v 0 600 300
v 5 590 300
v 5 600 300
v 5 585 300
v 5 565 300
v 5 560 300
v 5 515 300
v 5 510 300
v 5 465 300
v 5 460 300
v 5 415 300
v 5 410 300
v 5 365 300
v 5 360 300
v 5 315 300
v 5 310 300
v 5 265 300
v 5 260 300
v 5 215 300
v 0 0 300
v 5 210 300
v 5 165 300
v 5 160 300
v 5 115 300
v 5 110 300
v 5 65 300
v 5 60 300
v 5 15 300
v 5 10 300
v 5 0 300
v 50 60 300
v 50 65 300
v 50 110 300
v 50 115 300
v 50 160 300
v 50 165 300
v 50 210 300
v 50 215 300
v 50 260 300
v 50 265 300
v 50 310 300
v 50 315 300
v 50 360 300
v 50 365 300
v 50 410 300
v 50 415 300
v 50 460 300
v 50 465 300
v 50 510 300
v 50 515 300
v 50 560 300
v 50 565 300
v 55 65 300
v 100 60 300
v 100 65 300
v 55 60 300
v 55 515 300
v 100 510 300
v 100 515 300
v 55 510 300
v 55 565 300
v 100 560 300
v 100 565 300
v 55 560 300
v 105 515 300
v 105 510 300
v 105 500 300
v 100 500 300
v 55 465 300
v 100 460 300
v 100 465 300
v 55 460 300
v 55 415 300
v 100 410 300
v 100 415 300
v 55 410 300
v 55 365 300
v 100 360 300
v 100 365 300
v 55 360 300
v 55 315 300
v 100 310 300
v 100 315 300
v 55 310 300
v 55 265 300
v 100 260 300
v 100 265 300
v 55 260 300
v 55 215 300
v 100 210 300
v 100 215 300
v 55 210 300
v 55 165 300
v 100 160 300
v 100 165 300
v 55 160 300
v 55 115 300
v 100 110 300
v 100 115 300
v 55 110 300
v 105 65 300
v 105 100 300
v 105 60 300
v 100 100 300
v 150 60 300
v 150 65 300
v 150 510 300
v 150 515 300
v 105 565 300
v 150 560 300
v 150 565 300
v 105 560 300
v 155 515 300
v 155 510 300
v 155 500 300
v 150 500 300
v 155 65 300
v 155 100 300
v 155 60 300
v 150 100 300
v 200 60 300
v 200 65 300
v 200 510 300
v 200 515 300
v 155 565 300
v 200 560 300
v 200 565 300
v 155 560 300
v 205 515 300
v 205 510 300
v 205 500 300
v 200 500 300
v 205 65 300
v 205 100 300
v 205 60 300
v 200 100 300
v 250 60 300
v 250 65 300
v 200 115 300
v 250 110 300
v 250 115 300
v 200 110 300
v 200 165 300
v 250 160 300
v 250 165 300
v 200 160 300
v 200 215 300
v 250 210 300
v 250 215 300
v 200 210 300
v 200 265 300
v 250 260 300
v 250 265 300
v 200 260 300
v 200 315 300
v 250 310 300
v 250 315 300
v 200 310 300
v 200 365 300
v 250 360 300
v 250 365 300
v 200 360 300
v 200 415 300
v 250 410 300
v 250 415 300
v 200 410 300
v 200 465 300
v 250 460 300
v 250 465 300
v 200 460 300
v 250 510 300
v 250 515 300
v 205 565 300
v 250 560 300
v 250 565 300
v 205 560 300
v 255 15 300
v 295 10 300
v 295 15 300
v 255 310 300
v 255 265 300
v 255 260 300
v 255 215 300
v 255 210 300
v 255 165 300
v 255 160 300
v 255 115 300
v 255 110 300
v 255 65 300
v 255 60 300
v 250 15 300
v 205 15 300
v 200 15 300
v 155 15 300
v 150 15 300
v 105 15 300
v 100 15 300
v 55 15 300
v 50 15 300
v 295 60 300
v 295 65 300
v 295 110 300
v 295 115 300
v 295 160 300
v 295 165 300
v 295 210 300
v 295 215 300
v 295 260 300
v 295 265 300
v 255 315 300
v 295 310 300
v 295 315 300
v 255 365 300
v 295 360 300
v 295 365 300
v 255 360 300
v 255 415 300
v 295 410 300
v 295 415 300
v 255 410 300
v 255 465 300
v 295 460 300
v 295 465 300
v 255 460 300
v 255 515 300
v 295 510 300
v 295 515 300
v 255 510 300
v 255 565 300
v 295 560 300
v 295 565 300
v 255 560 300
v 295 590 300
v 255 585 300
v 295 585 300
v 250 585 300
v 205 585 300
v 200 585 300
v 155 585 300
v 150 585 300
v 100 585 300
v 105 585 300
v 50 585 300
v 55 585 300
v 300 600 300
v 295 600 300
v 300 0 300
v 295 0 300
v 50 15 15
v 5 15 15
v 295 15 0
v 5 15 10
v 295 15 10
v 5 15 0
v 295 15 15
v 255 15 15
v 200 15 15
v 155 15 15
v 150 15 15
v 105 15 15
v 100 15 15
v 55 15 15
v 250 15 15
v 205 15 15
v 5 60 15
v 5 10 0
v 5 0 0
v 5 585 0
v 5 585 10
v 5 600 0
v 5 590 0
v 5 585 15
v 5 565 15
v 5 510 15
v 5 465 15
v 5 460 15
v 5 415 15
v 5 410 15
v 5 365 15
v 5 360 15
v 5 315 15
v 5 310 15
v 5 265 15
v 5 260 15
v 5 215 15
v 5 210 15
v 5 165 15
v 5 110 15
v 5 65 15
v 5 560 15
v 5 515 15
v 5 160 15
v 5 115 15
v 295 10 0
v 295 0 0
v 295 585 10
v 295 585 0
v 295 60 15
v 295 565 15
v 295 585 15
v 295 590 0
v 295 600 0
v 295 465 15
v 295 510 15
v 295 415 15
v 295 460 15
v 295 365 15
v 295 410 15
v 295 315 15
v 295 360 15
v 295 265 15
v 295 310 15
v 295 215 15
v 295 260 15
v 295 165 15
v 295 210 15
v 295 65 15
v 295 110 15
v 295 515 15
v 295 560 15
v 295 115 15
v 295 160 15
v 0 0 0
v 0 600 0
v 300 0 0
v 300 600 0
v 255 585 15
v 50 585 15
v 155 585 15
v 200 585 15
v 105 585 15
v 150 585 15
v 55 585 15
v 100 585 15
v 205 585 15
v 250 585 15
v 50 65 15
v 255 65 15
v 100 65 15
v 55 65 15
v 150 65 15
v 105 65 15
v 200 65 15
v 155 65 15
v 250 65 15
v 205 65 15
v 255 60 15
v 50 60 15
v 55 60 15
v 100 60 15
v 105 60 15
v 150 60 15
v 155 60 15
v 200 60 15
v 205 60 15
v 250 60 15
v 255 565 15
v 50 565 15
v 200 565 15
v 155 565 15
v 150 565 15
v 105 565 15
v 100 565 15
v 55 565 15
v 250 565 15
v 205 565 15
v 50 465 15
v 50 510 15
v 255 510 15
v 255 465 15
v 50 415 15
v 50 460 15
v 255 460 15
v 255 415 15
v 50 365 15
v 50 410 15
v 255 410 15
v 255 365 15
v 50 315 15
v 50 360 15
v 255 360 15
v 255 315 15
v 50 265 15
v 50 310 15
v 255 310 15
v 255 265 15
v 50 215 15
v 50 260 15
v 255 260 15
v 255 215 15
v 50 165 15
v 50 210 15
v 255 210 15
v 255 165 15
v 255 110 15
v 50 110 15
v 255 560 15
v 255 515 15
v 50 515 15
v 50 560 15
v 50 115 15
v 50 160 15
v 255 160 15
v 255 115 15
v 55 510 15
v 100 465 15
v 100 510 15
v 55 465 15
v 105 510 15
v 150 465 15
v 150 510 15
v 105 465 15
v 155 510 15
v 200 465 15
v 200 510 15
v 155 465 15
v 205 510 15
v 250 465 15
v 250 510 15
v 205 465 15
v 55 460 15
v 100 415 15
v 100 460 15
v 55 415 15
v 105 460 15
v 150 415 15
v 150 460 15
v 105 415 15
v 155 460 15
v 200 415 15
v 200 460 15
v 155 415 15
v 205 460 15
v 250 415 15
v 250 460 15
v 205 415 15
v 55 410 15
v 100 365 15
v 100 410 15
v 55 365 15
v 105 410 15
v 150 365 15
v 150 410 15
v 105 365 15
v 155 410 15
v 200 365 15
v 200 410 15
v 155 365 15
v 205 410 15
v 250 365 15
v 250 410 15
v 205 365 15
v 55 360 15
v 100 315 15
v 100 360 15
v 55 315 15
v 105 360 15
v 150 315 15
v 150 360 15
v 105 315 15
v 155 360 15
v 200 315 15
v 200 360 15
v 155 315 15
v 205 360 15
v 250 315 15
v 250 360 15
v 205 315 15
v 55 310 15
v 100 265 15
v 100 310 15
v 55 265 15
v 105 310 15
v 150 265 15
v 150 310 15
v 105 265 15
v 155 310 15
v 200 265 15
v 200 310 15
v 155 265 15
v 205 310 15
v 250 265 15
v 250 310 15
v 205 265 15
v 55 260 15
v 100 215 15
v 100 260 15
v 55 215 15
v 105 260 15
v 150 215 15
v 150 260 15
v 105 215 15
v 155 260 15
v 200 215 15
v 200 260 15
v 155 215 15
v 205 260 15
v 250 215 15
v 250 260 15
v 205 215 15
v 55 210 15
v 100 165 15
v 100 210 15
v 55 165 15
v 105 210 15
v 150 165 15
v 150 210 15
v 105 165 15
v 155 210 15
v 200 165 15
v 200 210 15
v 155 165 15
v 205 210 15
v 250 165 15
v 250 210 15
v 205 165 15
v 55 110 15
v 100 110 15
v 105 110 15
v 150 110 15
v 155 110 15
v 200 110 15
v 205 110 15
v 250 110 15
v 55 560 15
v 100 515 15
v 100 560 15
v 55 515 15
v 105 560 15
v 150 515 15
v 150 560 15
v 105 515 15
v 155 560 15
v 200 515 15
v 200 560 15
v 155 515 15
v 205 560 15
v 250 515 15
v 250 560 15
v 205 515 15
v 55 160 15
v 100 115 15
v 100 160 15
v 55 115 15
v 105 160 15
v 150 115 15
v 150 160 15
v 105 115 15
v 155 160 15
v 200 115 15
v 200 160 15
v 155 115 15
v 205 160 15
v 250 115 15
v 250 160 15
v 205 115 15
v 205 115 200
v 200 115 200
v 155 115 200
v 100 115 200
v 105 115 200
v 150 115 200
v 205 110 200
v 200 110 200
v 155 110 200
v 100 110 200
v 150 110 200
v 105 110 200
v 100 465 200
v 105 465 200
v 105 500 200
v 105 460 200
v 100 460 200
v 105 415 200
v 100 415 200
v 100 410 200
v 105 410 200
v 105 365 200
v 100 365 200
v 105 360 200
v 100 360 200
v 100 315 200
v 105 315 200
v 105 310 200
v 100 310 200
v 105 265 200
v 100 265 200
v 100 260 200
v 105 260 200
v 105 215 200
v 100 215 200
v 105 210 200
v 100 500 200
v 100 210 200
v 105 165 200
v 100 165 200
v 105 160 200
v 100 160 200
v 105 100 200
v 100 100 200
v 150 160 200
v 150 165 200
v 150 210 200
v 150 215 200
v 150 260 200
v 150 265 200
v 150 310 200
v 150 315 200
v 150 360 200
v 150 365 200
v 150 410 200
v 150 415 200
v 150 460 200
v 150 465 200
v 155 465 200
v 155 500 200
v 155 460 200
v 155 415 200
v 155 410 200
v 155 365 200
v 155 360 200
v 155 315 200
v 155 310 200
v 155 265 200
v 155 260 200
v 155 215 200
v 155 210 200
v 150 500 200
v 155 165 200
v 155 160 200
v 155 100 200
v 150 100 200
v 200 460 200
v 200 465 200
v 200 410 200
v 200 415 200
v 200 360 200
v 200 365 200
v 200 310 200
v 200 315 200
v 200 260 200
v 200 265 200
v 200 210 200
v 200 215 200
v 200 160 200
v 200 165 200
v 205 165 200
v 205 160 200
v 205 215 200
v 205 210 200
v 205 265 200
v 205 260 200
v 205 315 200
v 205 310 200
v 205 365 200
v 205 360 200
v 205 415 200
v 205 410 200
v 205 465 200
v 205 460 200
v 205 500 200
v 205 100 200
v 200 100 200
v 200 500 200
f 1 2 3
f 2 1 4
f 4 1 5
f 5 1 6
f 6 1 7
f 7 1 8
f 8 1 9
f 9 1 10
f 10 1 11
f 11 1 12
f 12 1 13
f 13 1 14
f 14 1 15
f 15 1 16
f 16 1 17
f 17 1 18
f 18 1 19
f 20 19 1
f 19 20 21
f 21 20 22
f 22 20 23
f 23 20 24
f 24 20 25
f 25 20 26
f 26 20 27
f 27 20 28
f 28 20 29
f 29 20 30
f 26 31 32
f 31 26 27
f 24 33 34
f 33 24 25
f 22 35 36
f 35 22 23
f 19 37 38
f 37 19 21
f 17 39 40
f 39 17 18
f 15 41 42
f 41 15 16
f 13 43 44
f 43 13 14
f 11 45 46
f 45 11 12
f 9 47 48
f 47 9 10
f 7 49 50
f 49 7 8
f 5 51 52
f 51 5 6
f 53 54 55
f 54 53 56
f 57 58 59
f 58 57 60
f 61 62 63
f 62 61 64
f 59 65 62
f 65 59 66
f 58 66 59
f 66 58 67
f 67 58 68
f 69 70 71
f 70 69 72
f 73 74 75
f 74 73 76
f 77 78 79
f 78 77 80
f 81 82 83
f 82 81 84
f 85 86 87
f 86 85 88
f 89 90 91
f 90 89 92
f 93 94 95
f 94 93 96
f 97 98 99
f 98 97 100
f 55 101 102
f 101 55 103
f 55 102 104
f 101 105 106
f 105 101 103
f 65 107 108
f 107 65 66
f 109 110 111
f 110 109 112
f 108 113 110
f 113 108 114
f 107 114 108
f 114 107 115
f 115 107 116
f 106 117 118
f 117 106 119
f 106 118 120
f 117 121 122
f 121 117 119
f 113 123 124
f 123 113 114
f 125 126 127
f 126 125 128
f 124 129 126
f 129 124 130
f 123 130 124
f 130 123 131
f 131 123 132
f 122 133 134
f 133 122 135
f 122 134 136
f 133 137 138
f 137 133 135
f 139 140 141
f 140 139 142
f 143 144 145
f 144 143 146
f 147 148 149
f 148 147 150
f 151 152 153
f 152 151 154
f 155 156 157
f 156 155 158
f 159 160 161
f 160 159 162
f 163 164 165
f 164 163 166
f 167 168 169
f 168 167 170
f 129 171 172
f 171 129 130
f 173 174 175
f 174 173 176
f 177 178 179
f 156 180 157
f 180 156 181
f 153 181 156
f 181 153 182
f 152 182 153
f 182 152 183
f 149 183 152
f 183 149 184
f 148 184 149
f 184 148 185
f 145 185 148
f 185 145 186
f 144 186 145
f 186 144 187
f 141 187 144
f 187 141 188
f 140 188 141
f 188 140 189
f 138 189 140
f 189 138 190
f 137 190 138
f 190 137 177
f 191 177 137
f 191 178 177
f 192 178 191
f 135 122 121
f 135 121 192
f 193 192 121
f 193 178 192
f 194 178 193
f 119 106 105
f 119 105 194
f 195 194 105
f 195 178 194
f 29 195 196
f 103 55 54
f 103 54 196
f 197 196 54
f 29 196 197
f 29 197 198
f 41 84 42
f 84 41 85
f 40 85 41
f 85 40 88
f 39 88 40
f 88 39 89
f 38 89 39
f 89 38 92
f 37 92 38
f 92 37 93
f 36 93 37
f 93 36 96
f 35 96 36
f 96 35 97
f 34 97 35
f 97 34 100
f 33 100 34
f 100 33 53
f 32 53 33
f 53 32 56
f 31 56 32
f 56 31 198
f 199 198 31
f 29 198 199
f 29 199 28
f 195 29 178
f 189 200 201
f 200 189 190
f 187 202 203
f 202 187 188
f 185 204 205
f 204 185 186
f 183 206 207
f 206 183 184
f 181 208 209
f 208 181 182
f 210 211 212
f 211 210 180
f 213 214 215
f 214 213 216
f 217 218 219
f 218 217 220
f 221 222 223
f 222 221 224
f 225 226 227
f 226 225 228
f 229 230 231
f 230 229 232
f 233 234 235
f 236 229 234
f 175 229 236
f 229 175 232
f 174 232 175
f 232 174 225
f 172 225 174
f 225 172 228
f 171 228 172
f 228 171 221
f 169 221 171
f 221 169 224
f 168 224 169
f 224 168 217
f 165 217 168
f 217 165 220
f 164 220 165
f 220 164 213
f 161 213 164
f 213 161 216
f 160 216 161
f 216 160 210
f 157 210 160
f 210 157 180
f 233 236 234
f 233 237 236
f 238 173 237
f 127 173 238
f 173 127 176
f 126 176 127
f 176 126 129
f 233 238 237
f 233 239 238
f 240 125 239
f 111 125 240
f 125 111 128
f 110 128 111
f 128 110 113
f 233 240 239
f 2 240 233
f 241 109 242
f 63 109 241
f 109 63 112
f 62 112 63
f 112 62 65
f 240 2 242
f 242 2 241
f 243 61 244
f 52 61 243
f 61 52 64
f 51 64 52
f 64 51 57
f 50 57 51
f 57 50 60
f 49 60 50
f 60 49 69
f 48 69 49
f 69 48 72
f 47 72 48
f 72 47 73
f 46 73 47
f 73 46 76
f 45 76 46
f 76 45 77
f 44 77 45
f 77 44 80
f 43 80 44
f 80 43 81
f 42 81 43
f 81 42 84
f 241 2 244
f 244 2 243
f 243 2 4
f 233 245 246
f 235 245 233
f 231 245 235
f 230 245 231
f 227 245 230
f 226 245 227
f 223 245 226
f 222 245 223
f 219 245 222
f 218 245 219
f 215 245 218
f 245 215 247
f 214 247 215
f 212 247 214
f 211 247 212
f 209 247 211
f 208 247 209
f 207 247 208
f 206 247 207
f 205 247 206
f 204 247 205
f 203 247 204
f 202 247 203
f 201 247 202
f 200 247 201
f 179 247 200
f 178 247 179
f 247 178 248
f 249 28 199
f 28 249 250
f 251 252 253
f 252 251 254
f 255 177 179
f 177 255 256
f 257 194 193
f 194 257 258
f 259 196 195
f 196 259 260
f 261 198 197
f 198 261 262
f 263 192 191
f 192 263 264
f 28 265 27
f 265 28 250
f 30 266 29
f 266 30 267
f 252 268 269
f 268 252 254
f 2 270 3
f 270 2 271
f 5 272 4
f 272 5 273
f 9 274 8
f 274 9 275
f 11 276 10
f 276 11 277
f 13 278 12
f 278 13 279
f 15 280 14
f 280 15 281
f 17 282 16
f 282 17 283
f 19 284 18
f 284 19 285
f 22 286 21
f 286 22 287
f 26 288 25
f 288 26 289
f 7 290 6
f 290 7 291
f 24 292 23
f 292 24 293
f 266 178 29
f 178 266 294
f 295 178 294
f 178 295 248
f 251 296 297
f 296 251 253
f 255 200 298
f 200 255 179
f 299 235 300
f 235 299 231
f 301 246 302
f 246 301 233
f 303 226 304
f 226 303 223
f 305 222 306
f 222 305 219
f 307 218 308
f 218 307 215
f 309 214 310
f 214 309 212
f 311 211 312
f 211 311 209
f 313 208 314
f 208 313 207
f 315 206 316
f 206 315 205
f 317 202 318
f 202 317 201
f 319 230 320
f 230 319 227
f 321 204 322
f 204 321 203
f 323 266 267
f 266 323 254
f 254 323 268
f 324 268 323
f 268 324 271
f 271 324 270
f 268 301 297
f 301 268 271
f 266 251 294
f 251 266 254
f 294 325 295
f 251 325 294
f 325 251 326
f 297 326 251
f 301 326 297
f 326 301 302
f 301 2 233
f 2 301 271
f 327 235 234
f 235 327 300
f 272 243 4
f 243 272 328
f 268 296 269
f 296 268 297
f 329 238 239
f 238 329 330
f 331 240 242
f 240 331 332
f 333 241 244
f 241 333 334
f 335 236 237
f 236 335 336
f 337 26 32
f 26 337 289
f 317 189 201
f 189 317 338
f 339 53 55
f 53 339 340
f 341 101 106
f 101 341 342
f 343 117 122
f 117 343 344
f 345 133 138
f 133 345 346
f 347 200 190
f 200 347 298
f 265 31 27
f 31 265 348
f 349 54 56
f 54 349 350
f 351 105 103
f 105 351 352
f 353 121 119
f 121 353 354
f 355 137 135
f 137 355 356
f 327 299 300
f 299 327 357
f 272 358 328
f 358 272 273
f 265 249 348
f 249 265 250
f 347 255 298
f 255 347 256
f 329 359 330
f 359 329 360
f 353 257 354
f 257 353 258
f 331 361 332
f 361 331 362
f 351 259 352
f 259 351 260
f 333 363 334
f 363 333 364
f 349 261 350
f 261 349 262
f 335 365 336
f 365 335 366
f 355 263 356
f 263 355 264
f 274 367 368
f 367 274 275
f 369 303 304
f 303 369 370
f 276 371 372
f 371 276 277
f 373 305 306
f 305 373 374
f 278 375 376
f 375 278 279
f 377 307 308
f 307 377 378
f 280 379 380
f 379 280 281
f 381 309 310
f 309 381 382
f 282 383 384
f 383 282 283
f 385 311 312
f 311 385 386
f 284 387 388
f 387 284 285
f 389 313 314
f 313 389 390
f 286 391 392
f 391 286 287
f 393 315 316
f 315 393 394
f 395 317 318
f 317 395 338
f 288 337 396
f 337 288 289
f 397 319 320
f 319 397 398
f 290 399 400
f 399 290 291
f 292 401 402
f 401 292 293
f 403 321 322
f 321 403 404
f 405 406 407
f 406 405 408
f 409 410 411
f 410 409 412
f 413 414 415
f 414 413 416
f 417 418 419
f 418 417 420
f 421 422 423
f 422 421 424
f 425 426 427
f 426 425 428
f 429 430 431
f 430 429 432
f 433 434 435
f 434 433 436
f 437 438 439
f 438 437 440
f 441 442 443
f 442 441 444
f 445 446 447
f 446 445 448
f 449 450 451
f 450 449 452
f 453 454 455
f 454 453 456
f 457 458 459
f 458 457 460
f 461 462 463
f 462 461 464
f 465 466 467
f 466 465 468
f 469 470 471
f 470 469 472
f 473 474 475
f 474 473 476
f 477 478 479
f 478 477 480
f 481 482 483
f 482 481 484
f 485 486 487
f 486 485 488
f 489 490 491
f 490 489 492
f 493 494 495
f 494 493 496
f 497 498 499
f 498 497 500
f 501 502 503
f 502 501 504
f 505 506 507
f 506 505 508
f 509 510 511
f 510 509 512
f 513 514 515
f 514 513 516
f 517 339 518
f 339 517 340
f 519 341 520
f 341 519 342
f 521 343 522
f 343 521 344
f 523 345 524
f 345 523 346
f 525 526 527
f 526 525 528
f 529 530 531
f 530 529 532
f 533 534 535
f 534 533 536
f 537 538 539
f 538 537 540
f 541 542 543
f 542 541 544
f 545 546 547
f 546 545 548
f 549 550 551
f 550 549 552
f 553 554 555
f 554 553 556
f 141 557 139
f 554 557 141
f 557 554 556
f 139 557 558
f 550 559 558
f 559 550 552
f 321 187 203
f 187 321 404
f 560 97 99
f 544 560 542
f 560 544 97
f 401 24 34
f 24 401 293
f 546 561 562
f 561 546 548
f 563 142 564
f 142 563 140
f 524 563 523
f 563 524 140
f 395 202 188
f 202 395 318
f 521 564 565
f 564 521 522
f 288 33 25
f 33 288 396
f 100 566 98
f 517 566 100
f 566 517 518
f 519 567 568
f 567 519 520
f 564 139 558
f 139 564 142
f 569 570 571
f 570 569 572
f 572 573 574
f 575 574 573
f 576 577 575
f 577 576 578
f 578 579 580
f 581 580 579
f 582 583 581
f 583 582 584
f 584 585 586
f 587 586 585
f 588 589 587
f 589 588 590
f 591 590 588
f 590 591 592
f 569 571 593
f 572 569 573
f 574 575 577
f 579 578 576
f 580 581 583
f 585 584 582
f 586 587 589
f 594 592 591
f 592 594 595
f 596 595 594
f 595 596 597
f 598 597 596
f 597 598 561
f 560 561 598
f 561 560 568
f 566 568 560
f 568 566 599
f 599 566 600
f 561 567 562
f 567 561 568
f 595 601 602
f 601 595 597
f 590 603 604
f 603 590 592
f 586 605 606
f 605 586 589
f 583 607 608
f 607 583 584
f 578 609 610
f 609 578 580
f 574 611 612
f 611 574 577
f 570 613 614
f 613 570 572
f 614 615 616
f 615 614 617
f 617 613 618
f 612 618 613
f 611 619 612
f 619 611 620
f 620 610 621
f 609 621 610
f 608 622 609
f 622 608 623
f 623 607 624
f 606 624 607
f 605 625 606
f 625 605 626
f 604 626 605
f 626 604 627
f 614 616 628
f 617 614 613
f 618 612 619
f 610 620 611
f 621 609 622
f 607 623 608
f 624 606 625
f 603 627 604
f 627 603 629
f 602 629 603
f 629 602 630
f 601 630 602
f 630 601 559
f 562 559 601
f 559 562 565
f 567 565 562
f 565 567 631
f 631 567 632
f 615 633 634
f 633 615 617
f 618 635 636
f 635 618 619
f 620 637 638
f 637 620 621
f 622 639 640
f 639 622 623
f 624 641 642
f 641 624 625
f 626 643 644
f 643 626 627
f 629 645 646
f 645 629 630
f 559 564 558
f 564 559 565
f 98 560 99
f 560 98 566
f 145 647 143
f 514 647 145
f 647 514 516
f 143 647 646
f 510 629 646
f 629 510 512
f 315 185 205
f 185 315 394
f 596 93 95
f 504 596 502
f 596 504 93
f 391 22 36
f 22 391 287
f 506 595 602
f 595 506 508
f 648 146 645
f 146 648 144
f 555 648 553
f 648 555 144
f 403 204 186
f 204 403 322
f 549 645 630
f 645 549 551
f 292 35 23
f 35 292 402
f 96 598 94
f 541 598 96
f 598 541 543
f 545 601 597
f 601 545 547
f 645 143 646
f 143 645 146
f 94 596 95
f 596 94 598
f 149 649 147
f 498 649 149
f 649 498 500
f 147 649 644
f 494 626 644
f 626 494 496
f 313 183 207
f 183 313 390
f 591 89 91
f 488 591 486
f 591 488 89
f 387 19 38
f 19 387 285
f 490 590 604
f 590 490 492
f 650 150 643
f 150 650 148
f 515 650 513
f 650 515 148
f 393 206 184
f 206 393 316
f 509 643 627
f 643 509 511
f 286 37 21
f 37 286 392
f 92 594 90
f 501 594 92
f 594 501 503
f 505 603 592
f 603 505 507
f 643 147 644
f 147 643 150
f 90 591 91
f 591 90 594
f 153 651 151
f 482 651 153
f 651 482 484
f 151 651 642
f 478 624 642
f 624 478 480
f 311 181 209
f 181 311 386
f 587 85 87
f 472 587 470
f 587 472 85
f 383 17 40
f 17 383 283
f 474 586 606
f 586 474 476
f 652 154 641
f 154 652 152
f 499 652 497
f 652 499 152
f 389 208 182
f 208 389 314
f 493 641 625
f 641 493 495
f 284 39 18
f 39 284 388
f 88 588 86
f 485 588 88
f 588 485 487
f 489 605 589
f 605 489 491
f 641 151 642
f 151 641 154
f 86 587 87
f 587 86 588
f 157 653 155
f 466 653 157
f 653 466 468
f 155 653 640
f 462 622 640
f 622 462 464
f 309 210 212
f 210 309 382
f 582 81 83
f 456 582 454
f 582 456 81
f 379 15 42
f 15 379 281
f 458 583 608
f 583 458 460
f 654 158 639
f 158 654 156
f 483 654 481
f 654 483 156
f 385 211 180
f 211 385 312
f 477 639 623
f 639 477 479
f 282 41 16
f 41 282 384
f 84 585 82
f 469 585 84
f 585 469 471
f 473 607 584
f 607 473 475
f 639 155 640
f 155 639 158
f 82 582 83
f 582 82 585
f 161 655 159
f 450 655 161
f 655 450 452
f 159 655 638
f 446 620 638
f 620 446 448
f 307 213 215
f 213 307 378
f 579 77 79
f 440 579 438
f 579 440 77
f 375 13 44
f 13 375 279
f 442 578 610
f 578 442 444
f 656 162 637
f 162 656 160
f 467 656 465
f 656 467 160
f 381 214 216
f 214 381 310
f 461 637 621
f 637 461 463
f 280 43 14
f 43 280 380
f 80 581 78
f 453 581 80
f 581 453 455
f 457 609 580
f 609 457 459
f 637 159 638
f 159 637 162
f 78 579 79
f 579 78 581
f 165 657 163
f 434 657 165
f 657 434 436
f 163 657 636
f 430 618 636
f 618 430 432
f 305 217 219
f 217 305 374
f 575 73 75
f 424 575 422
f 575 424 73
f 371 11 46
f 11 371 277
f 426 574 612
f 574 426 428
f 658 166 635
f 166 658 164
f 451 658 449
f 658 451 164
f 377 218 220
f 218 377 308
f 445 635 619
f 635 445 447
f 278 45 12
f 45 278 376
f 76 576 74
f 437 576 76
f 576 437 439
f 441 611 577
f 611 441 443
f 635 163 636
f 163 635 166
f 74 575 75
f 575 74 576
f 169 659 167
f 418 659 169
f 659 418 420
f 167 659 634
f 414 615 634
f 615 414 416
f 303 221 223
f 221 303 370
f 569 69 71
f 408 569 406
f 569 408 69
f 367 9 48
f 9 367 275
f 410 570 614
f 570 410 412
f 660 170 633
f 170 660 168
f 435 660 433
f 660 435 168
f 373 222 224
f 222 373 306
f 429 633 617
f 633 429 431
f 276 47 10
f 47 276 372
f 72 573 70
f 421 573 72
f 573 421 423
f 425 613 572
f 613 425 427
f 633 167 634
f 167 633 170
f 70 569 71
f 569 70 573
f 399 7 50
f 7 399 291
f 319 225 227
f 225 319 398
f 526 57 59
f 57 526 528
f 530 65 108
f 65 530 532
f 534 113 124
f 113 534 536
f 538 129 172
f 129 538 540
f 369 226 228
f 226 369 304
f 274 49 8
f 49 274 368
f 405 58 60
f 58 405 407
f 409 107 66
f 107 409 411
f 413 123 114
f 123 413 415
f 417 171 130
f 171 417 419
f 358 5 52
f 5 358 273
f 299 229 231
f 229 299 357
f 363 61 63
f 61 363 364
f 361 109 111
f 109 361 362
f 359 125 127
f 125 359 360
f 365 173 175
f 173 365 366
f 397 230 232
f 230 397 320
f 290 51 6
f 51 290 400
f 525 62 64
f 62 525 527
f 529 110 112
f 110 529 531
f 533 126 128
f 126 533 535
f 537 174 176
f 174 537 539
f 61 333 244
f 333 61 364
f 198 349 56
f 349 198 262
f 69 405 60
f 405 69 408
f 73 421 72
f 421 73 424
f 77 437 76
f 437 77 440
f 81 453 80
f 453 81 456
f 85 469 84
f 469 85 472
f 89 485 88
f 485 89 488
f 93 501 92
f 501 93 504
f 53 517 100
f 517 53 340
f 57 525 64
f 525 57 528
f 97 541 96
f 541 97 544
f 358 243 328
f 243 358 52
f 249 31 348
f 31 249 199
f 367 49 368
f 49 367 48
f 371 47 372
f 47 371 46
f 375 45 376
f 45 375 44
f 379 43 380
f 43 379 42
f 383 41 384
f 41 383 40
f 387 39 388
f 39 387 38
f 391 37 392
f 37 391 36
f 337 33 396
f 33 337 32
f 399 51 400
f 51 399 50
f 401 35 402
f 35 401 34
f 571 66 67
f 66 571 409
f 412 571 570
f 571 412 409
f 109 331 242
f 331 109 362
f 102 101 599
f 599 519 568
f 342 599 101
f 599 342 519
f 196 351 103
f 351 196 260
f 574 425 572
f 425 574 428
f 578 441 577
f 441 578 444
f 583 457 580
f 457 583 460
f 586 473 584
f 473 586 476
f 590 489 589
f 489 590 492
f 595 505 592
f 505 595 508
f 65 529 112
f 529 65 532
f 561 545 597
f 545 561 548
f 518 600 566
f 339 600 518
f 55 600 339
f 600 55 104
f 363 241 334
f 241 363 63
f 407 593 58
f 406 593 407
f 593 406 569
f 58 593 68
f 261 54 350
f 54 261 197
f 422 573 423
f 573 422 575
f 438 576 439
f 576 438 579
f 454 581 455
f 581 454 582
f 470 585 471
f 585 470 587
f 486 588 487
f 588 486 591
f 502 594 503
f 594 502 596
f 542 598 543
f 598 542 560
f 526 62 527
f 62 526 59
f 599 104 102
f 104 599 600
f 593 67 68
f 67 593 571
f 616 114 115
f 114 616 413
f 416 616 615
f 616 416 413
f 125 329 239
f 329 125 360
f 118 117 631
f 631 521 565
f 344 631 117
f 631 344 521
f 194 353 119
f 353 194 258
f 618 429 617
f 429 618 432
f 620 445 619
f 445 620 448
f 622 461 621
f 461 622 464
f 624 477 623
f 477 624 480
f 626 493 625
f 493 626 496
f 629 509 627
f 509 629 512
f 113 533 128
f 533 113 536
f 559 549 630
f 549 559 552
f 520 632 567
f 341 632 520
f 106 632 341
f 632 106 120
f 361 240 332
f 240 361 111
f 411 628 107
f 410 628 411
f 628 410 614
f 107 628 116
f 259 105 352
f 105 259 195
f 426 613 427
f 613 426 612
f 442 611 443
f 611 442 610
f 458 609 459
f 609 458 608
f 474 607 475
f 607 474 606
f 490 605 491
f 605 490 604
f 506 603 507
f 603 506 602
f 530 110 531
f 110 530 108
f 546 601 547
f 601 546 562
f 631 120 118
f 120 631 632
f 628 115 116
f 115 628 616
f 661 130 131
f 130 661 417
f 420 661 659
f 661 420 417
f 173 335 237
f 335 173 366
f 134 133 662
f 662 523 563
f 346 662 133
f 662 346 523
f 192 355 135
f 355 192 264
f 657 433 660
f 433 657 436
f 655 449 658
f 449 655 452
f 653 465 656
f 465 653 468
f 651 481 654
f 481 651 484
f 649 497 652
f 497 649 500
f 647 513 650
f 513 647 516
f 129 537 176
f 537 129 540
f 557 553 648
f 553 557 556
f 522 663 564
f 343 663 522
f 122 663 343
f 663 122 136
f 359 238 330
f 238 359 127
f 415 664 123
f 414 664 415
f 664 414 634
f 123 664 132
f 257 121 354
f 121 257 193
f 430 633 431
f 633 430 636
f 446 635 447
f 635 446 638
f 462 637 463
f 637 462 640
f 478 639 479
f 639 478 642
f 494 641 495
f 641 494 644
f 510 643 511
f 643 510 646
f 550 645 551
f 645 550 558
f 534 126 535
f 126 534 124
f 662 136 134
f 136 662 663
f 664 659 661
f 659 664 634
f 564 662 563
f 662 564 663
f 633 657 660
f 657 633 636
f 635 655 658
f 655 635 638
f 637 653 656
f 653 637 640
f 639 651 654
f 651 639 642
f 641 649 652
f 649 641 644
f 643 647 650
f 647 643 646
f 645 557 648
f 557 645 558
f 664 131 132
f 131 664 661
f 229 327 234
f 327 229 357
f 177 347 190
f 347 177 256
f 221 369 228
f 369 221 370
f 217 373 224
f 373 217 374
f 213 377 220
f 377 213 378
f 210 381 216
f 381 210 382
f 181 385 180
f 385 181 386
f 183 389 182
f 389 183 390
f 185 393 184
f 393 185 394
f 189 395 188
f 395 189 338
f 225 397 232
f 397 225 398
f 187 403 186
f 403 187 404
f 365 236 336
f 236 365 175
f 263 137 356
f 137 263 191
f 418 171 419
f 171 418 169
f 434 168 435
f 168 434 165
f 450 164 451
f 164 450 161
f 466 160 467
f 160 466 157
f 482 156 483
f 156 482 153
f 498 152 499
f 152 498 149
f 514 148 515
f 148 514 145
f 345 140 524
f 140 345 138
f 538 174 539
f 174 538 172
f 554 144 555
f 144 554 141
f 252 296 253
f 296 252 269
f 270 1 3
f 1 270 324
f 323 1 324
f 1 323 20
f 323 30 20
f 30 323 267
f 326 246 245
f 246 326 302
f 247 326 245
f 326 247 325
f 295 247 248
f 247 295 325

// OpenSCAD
// file: lib.scad
// Das Modul verzahnugn() macht die form, für eine Reihe von Zähnen (true) beziehungsweise Löcher (false) für dies Zähne. Die laenge gibt an, über welche Strecke verzahnt werden soll, wobei darauf geachtet ist, dass dafor und dahinter genügend Platz bleibt. z gibt an, ob die form für den Zapfen oder für den Stollen gemacht werden soll. Und die zahnlaenge, wie  groß die Zähne werden.
// Es benutzt die Module Zapfen (Zähne) und Stollen (Löcher). Ausserdem hängt es von den Besonderen Variablen $thickness und $spiel ab.

module verzahnung(laenge, z = true,zahnlaenge=10)
{
   
    positionen=[for (k = [zahnlaenge : 2*zahnlaenge : laenge-2*zahnlaenge])k];
    if (!(len(positionen)>0)) echo("<font color='red'>verzahnungsfehler</font>");
    if (len(positionen)==1) echo("<font color='red'>reicht dir ein Zahn?</font>");

    rest=laenge-(positionen[len(positionen)-1]+zahnlaenge);
    translate([0,(rest-zahnlaenge)/2])
    {
        for (k = positionen)
        {
               translate([0,k]) 
		{ 
                if (z) zapfen(zahnlaenge);
                else stollen (zahnlaenge);
                }
         }
     }
}

//Das Modul stollen() macht die Form für ein einzelnes Loch passend zum dazugehörigen Zapfen.

module stollen(zahnlaenge=10)
{
    translate([-0.5*$spiel, 0]) square([$thickness+$spiel, zahnlaenge]);
}

//Das Modul zapfen() macht die Form für einen einzelnen Zahn, passend zum dazugehörigen Stollen.

module zapfen(zahnlaenge=10)
{
    wurzel=0.1;  
    //gibt an, wie weit sich der Zapfen mit seinem ursrpung überschneidet hierdurch wird verhindert, dass kleine rechenfehler dazu führen, dass er abgeschnitten wird.
    translate([-wurzel, 0.5*$spiel]) square([$thickness+wurzel, zahnlaenge - $spiel]);
}

 function tensor (z)
	=(
	z ? 1
	:
	!z ? 0
    : false
	);

 module steckung(laenge,z=true)
{
	
translate([laenge*tensor(z)/2,-0.5*$spiel])square([laenge/2+$spiel/2,$thickness+$spiel]);

}
//Das Modul aufbau gibt eine Animationssystematik. Die mit ihm aufgerufenen Module erscheinen in der Reihenfolge des aufrufes.
module aufbau()
{
    for(n=[0:$children-1])if($t*$children>=n)children(n);
}
// main file
include <lib.scad>;
$thickness=5;
$spiel=0;

breite=600;
tiefe=300;
hoehe=300;
rand=10;

glasbreite=400;
glastiefe=400;
spiegelbreite=400;
spiegeltiefe=400;

innenbreite=400;
innentiefe=100;
innenhoehe=100;

rippenabstand=50; 

resthoehe=hoehe-($thickness+rand);
restbreite=breite-2*($thickness+rand);

resttiefe=tiefe-2*($thickness);


module unterseite()
{
    square([resttiefe,restbreite]);
   
}
module vorderseite()
{
    square([hoehe,breite]);
}
module rueckseite()
{
    square([hoehe,breite]);
}
module seite()
{
    square([resttiefe,hoehe]);
}

module tiefe_rippe(pos)
{
    difference()
    {
        square([resttiefe,resthoehe]);
    if  ( pos>=(restbreite-innenbreite)/2
         &&
         pos<= (restbreite+innenbreite)/2+$thickness)
           
            translate([(resttiefe-innentiefe)/2,resthoehe-innenhoehe]) 
                square ([innentiefe,innenhoehe]);
    }
}
module breite_rippe(pos)
{
    difference()
    {
        square([resthoehe,restbreite]);
            if  ( pos>=(tiefe-innentiefe)/2-$thickness
                 &&
                 pos<=(tiefe+innentiefe)/2)
           
    translate([resthoehe-innenhoehe,(restbreite-innenbreite)/2]) square ([innenhoehe,innenbreite]);
    }
}

module assemble()
{
   translate([$thickness,rand+$thickness,rand]) linear_extrude($thickness) unterseite();
   translate([$thickness,0,0]) rotate(-90,[0,1,0]) linear_extrude($thickness) vorderseite();
    translate([tiefe,0,0]) rotate(-90,[0,1,0]) linear_extrude($thickness) rueckseite();
   for(k=[[$thickness,$thickness+rand,0],[$thickness,breite-rand,0]]) translate(k) rotate(90,[1,0,0]) linear_extrude($thickness) seite();
   translate([$thickness,rand+$thickness,rand+$thickness])
    {   
       for(k=[rippenabstand:rippenabstand:restbreite]) translate([0,k,0]) 
      
              rotate(90,[1,0,0]) linear_extrude($thickness) tiefe_rippe(k);
       
            #     for(k=[rippenabstand:rippenabstand:resttiefe])  translate([k,0,0]) rotate(-90,[0,1,0]) linear_extrude($thickness) breite_rippe(k);
                 }


}
 assemble();
